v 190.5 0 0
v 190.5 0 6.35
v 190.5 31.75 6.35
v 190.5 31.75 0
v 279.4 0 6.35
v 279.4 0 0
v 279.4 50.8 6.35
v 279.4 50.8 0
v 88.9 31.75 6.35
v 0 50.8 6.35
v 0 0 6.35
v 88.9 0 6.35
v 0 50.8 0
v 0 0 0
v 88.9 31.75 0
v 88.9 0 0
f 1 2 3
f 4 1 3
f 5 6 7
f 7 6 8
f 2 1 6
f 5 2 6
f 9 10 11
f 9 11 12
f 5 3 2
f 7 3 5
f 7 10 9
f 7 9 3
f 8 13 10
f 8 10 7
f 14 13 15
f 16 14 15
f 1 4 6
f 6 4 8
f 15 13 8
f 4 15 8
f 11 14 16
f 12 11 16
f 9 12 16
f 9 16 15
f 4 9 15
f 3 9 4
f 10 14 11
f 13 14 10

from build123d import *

# Parameters (mm, degrees)
BOX001_W                    = 279.4
BOX001_H                    = 50.8
BOX001_DEPTH                = 6.35
BOX001_PLACEMENT_ANGLE      = 30
BASEFEATURE_PLACEMENT_ANGLE = 30
SKETCH001_W                 = 101.6
SKETCH001_H                 = 31.75
POCKET_DEPTH                = 6.351


with BuildPart() as part:
    # Box001 → Box001 (new body)
    with BuildSketch(Plane.XY):
        with Locations((139.7, 25.4)):
            Rectangle(BOX001_W, BOX001_H)
    extrude(amount=BOX001_DEPTH)


with BuildPart() as part_1:
    # Box001 placement: moved
    add(part.part.moved(Location((0, 0, -417.576))).rotate(Axis((0, 0, -417.576), (-1, 0, 0)), BOX001_PLACEMENT_ANGLE))


with BuildPart() as part_2:
    # BaseFeature placement: moved
    add(part_1.part.moved(Location((0, -208.788, 361.631424))).rotate(Axis((0, -208.788, 361.631424), (1, 0, 0)), BASEFEATURE_PLACEMENT_ANGLE))

    # Sketch001 (on DatumPlane) → Pocket (cut, through all)
    with BuildSketch(Plane.XY.offset(6.35)):
        with Locations((139.7, 15.875)):
            Rectangle(SKETCH001_W, SKETCH001_H)
    extrude(amount=-POCKET_DEPTH, mode=Mode.SUBTRACT)


solid = part_2.part
